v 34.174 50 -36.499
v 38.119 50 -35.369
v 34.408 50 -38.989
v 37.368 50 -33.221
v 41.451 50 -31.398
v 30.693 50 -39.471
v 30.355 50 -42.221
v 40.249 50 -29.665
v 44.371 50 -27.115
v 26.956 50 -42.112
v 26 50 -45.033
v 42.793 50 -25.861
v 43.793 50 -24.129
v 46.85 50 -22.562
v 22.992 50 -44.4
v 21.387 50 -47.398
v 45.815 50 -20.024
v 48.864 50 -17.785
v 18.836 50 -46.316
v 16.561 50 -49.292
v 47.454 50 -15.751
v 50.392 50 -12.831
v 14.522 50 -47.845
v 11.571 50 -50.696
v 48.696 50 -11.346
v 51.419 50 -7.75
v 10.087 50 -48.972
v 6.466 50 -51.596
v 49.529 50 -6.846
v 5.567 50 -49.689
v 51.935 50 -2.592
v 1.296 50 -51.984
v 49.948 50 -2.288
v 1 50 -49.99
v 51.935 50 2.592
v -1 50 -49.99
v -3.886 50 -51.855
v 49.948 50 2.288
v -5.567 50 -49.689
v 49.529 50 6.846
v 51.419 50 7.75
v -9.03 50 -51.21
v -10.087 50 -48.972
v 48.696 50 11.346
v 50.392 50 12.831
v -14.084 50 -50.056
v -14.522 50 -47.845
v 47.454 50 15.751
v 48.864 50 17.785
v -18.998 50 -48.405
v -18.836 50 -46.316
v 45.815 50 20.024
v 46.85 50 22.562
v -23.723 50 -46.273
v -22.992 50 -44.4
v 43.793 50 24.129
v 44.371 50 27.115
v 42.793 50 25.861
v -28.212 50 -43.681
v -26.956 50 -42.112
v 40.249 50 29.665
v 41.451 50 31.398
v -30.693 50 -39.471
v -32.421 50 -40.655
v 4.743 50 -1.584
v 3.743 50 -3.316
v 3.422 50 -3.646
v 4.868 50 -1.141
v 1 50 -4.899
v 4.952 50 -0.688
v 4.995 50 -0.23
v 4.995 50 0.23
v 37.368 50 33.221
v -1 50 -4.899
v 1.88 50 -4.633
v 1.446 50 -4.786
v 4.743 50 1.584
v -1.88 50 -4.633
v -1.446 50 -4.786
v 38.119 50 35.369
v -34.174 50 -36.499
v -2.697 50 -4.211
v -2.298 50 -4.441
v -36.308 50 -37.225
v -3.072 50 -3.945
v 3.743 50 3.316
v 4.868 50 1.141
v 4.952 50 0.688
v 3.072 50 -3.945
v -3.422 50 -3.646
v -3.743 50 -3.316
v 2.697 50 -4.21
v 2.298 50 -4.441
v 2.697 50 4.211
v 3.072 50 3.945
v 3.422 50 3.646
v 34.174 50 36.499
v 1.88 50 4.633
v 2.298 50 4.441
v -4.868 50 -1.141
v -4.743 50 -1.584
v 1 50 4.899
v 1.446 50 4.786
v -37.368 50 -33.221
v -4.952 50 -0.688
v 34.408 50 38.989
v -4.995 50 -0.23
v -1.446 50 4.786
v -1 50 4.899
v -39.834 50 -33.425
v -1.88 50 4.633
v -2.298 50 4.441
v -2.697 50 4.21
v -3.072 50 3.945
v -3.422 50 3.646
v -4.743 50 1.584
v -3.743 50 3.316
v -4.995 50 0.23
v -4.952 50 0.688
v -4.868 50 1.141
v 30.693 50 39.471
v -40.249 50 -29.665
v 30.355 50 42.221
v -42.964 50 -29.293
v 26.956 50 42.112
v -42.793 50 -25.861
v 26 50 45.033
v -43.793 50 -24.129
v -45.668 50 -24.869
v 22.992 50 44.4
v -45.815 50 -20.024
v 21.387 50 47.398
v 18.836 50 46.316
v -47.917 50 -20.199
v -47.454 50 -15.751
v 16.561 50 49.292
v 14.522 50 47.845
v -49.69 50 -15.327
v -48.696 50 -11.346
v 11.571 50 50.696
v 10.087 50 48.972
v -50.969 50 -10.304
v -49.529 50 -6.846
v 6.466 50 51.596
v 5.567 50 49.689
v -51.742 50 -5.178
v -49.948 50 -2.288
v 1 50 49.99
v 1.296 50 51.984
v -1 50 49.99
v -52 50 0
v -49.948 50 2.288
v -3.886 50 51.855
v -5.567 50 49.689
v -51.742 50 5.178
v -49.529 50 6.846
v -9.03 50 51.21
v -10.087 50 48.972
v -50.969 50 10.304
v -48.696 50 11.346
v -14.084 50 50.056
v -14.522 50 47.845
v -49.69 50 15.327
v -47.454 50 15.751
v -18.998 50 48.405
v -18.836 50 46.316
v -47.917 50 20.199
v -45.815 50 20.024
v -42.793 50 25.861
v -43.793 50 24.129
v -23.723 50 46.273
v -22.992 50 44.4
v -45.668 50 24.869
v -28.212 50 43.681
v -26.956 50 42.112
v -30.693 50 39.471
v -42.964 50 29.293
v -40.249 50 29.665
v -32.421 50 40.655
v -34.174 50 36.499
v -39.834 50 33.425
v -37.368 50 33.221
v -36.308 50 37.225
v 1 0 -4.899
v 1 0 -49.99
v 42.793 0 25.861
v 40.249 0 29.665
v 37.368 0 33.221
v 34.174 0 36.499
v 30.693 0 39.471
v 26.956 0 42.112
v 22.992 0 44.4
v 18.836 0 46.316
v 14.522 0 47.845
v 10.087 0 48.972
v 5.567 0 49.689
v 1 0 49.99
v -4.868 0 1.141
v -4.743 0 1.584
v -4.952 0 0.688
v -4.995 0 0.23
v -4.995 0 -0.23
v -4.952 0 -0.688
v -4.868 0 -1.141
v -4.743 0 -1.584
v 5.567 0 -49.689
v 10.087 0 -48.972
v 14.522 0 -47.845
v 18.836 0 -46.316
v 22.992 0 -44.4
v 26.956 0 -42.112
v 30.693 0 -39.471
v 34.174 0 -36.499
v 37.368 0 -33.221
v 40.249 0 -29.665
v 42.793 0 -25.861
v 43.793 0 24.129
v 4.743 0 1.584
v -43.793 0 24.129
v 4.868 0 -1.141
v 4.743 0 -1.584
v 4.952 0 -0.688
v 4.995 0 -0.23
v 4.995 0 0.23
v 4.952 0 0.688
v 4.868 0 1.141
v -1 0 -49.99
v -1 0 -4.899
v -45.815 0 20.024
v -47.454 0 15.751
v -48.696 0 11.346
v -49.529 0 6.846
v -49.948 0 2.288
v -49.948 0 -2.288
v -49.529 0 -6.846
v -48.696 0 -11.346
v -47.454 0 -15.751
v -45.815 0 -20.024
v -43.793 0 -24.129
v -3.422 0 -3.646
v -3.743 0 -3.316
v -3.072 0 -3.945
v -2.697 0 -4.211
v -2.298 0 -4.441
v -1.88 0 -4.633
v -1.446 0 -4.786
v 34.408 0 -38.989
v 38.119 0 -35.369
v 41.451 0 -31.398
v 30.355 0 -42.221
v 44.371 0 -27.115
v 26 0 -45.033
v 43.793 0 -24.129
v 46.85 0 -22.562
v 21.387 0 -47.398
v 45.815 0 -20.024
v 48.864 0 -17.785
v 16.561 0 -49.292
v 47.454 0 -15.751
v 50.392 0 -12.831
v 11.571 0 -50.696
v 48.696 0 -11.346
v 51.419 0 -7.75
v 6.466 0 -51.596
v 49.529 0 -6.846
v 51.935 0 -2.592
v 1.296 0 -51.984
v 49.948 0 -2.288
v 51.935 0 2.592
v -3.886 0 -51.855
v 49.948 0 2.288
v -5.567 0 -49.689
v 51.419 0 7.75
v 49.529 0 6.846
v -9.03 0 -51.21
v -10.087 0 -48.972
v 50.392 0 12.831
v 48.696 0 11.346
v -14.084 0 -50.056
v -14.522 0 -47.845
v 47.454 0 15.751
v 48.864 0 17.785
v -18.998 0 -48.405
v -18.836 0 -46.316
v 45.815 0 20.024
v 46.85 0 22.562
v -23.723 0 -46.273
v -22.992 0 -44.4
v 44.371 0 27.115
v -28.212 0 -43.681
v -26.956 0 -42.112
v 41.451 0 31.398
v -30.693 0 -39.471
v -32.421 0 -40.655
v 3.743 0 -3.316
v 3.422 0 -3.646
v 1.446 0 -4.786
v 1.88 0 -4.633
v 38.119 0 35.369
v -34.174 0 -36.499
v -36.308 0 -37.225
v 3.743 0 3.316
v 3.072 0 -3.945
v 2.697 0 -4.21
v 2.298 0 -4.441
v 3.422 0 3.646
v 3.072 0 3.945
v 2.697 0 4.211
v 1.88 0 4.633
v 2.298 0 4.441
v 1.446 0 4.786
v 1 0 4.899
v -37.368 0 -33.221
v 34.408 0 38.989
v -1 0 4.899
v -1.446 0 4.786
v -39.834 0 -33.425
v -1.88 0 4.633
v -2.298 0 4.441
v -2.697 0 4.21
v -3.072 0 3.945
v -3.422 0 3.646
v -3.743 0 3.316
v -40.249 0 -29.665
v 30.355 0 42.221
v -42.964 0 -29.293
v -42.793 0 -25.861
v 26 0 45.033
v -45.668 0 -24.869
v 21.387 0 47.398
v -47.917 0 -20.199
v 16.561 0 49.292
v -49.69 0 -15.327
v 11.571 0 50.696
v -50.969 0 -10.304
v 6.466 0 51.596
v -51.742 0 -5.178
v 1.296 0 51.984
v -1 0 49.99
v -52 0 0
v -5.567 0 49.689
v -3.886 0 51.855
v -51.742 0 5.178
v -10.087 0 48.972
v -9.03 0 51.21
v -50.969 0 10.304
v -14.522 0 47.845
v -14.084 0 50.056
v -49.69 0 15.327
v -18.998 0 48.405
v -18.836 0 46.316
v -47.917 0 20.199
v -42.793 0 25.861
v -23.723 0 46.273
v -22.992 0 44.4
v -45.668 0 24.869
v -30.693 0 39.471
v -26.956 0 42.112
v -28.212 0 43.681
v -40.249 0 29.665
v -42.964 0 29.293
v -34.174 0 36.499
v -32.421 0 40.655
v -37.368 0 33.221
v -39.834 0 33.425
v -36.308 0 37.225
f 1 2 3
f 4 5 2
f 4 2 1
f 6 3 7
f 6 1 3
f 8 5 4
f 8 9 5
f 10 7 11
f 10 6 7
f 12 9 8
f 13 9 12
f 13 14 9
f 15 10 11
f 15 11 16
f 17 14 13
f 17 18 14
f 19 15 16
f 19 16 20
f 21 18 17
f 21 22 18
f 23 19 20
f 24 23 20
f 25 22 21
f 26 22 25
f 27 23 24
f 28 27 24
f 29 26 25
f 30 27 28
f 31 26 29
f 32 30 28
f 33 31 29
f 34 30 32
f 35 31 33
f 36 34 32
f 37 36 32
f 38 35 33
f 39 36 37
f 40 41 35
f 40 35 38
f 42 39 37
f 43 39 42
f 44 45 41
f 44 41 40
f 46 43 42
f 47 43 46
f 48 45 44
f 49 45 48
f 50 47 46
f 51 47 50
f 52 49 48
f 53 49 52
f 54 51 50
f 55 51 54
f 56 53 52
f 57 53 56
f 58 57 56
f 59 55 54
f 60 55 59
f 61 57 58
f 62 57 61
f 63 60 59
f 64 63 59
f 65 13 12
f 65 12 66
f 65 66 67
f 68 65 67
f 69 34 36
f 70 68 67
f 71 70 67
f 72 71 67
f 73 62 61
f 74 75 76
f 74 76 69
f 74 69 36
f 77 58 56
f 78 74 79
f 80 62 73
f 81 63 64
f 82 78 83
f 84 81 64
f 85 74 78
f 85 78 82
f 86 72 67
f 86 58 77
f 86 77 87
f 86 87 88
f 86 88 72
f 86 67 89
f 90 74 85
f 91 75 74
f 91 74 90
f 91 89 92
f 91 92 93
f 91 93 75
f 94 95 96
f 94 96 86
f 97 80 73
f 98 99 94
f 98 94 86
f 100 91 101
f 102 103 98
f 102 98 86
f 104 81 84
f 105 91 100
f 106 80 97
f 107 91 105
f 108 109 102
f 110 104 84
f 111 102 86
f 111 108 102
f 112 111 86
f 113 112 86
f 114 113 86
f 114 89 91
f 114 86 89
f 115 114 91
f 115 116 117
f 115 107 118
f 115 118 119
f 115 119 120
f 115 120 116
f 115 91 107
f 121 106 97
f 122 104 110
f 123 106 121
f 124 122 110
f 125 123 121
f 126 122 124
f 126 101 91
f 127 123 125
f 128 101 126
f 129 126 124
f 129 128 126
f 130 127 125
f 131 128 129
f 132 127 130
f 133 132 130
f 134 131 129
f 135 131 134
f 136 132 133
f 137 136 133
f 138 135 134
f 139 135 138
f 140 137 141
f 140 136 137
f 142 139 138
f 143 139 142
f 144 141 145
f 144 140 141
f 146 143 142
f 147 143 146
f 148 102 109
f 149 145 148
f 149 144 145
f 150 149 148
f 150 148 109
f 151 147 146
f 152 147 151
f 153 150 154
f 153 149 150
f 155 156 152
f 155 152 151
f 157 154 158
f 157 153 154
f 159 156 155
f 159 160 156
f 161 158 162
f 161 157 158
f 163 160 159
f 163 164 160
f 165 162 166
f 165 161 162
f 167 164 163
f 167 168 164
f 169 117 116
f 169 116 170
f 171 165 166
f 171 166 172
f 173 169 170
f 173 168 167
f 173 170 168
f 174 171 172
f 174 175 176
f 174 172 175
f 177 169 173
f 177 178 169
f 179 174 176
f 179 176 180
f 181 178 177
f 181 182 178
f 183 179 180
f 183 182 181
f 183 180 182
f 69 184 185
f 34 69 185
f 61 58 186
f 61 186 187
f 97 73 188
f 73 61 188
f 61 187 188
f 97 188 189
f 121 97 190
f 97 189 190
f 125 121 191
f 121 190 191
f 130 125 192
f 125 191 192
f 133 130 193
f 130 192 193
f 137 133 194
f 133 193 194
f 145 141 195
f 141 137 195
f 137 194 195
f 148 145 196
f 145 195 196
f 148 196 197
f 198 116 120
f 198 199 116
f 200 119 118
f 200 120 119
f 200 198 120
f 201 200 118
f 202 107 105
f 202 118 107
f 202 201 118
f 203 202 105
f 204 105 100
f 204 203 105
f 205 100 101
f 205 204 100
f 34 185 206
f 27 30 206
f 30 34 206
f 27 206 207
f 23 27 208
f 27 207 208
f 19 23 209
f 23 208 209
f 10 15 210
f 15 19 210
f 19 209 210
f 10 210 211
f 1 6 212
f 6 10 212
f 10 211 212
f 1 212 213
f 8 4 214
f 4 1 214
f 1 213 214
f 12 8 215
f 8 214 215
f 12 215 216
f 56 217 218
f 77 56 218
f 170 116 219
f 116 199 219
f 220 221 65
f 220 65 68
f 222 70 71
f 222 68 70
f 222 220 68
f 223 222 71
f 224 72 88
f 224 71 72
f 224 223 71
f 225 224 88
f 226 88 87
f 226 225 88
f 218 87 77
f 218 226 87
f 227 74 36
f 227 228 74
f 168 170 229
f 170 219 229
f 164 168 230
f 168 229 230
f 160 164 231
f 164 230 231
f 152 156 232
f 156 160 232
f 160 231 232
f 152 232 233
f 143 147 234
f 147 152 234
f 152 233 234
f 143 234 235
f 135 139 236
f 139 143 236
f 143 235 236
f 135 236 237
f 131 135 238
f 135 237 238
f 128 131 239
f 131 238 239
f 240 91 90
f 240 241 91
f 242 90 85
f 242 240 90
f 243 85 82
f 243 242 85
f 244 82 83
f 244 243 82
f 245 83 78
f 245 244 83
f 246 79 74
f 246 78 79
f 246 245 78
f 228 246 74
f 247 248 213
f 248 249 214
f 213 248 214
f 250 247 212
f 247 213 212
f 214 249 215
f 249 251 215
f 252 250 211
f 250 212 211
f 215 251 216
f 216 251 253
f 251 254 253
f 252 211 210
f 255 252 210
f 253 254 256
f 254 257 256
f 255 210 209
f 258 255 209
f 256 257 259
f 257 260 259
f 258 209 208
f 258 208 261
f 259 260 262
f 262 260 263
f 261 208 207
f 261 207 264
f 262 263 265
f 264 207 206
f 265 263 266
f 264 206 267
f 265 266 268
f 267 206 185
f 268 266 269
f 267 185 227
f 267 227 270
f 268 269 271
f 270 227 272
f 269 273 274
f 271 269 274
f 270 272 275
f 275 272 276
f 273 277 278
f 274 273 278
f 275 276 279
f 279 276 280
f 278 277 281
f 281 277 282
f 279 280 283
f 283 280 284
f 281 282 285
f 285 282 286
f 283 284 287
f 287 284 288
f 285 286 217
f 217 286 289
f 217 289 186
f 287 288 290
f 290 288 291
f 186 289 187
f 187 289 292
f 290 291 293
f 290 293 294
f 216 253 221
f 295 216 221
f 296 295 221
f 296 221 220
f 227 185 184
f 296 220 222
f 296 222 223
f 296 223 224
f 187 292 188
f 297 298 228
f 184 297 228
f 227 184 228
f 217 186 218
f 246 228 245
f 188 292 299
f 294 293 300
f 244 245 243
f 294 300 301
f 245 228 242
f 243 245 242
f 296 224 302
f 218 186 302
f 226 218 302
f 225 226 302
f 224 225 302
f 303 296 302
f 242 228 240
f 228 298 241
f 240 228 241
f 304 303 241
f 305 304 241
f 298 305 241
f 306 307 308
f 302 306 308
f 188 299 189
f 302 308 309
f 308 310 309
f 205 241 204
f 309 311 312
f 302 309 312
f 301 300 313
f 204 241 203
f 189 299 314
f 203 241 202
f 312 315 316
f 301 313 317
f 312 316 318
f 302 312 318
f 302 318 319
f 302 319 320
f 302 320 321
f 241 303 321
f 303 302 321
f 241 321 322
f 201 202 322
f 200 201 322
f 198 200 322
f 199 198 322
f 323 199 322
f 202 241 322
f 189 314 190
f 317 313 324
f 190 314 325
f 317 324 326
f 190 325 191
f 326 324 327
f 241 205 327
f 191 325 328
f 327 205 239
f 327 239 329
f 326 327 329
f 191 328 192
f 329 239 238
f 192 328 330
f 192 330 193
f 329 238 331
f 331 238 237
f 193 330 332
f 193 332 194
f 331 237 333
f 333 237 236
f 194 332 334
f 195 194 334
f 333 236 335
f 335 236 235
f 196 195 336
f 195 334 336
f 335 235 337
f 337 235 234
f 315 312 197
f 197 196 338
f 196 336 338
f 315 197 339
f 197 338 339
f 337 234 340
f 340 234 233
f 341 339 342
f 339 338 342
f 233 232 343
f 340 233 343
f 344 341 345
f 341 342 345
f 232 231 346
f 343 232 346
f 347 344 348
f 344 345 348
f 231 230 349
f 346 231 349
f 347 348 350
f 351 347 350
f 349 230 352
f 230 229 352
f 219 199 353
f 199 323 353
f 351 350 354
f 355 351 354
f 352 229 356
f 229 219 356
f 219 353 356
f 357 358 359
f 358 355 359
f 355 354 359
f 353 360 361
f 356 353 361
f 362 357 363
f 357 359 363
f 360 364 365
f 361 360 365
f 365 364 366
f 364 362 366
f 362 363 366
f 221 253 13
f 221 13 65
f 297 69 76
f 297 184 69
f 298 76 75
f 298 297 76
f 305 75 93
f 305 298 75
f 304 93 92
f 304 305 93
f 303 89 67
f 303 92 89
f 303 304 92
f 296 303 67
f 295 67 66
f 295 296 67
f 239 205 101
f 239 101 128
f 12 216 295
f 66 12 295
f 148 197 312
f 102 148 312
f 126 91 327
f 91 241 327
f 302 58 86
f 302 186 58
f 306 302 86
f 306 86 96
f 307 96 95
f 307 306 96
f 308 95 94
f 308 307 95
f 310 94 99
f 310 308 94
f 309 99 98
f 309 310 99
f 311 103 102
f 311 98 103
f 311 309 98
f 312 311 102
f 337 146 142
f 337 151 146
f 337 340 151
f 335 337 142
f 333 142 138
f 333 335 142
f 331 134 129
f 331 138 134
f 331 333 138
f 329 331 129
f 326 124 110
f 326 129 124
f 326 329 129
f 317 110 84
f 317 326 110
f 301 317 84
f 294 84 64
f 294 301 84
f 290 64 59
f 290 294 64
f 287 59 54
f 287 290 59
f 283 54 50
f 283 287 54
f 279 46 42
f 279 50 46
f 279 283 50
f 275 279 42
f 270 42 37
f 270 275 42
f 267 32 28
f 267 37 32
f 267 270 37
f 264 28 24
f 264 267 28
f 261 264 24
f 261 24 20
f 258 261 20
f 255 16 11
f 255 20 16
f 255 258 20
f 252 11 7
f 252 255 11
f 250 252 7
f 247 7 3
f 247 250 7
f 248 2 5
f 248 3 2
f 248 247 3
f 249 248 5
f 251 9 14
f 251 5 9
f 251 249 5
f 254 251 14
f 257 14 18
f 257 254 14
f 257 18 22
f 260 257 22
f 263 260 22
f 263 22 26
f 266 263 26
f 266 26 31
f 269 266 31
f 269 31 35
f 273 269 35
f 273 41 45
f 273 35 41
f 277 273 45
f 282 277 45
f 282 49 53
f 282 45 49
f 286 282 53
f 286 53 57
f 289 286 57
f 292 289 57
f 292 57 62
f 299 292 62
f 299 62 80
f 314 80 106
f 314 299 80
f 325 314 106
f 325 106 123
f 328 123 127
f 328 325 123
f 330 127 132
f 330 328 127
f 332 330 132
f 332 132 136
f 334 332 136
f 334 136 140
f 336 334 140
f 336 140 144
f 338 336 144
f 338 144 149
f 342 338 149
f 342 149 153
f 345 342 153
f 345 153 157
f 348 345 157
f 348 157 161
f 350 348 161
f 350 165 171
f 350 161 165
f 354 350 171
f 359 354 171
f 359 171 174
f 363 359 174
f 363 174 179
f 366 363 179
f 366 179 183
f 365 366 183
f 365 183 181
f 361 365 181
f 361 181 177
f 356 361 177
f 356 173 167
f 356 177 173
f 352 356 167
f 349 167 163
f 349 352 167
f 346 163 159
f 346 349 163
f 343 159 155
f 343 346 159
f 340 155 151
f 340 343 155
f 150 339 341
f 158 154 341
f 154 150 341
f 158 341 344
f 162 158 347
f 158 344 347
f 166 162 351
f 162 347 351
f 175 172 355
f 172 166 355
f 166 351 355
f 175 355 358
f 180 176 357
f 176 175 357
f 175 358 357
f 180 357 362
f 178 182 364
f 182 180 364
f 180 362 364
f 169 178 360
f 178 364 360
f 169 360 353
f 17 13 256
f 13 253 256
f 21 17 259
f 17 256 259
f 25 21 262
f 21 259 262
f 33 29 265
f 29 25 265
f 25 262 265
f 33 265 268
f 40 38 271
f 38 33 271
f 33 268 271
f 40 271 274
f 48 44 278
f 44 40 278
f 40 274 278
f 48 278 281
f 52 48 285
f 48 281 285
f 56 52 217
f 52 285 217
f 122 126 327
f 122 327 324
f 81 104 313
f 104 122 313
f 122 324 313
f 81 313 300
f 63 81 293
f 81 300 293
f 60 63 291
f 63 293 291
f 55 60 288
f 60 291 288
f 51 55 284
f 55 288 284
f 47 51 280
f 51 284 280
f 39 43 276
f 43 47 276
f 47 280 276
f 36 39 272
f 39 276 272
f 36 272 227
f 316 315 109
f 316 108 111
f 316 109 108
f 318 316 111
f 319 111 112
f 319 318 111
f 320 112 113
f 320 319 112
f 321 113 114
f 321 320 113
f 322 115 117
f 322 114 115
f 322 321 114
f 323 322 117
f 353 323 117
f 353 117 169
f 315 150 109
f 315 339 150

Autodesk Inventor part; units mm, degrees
ref_plane "YZ Plane" through (0, 0, 0) normal (1, 0, 0) x (0, 1, 0)
ref_plane "XZ Plane" through (0, 0, 0) normal (0, 1, 0) x (-1, 0, 0)
ref_plane "XY Plane" through (0, 0, 0) normal (0, 0, 1) x (1, 0, 0)
sketch "Sketch1" plane through (0, 0, 0) normal (0, 1, 0) x (-1, 0, 0)
  line L0 (42.7926, 25.861) -> (42.8013, 25.866)
  line L1 (43.7926, 24.129) -> (43.8013, 24.134)
  line L2 (1, 50) -> (1, 49.99)
  line L3 (-1, 50) -> (-1, 49.99)
  line L4 (42.7926, -25.861) -> (42.8013, -25.866)
  line L5 (43.7926, -24.129) -> (43.8013, -24.134)
  line L6 (1, -49.99) -> (1, -50)
  line L7 (-1, -49.99) -> (-1, -50)
  line L8 (-42.8013, -25.866) -> (-42.7926, -25.861)
  line L9 (-43.8013, -24.134) -> (-43.7926, -24.129)
  line L10 (-43.8013, 24.134) -> (-43.7926, 24.129)
  line L11 (-42.8013, 25.866) -> (-42.7926, 25.861)
  line L12 (4.7426, 1.5835) -> (43.7926, 24.129)
  line L13 (4.7426, -1.5835) -> (43.7926, -24.129)
  line L14 (1, 49.99) -> (1, 4.899)
  line L15 (3.7426, 3.3155) -> (42.7926, 25.861)
  line L16 (-42.7926, 25.861) -> (-3.7426, 3.3155)
  line L17 (-1, 49.99) -> (-1, 4.899)
  line L18 (-43.7926, -24.129) -> (-4.7426, -1.5835)
  line L19 (-43.7926, 24.129) -> (-4.7426, 1.5835)
  line L20 (-42.7926, -25.861) -> (-3.7426, -3.3155)
  line L21 (-1, -4.899) -> (-1, -49.99)
  line L22 (3.7426, -3.3155) -> (42.7926, -25.861)
  line L23 (1, -4.899) -> (1, -49.99)
  circle A0 centre (0, 0) radius 52
  arc A1 (-1, 49.99) -> (-42.7926, 25.861) centre (0, 0) ccw
  arc A2 (-43.7926, 24.129) -> (-43.7926, -24.129) centre (0, 0) ccw
  arc A3 (-42.7926, -25.861) -> (-1, -49.99) centre (0, 0) ccw
  arc A4 (1, -49.99) -> (42.7926, -25.861) centre (0, 0) ccw
  arc A5 (43.7926, -24.129) -> (43.7926, 24.129) centre (0, 0) ccw
  arc A6 (42.7926, 25.861) -> (1, 49.99) centre (0, 0) ccw
  arc A7 (1, -4.899) -> (3.7426, -3.3155) centre (0, 0) ccw
  arc A8 (-3.7426, -3.3155) -> (-1, -4.899) centre (0, 0) ccw
  arc A9 (-4.7426, 1.5835) -> (-4.7426, -1.5835) centre (0, 0) ccw
  arc A10 (-1, 4.899) -> (-3.7426, 3.3155) centre (0, 0) ccw
  arc A11 (4.7426, -1.5835) -> (4.7426, 1.5835) centre (0, 0) ccw
  arc A12 (3.7426, 3.3155) -> (1, 4.899) centre (0, 0) ccw
extrude "Extrusion1" add sketch "Sketch1" along normal blind 50
properties part number "wheel"
